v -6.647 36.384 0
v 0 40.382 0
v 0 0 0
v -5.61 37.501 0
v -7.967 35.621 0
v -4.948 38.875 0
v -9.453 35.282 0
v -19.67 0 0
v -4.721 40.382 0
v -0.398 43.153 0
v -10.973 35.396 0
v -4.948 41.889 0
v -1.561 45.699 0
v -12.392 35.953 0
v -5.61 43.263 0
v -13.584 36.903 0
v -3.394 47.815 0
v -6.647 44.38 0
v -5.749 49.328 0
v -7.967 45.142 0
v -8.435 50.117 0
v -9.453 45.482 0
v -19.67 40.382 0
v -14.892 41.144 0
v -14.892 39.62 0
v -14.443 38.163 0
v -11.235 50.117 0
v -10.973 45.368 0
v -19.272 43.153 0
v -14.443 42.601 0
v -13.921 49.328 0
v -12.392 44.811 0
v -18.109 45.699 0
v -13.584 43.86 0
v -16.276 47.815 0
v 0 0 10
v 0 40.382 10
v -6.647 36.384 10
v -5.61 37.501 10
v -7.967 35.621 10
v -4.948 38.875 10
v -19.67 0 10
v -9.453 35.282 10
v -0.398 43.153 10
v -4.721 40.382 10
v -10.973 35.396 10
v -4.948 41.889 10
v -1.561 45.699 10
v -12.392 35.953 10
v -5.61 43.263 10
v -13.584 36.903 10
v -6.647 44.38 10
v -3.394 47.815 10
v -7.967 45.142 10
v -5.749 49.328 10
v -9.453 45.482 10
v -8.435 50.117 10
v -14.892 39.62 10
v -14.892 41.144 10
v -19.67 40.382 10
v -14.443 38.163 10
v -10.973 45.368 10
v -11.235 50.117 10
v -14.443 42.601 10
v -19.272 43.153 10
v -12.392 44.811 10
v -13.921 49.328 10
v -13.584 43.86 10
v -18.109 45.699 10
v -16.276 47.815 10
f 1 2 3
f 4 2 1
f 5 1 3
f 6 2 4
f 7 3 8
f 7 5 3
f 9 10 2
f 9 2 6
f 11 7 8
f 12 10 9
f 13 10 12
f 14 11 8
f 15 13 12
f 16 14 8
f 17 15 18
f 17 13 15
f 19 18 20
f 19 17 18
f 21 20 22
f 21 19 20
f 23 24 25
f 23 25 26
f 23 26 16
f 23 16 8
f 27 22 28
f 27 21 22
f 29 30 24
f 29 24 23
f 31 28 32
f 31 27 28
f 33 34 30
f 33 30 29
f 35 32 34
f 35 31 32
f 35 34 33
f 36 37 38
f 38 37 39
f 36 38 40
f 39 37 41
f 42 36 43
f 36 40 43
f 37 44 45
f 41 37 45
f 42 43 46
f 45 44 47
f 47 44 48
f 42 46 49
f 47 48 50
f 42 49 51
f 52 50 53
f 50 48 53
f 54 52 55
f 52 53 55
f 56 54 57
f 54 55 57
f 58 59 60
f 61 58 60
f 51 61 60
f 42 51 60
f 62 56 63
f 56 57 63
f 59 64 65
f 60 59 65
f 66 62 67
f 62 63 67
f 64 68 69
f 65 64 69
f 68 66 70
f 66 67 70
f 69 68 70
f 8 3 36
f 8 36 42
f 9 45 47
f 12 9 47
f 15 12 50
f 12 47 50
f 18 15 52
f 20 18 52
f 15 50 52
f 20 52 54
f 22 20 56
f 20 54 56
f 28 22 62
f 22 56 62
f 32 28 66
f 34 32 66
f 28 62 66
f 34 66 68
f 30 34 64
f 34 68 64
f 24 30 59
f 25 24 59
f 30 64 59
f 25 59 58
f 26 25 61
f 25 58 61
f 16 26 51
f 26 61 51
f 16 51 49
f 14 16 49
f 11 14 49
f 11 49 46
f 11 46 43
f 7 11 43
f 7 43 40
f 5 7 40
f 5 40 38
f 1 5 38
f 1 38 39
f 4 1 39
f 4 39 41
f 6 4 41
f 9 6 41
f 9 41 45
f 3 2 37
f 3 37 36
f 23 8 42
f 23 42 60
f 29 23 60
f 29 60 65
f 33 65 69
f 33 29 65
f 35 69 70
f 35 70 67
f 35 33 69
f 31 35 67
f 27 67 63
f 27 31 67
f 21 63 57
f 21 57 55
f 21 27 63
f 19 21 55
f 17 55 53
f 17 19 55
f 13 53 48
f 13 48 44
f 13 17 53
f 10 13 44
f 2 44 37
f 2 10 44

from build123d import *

# Parameters (mm, degrees)
BOSS_EXTRUDE1_DEPTH = 10
CUT_EXTRUDE1_REACH  = 56.851
SKETCH2_R           = 5.114059111


with BuildPart() as part:
    # Sketch1 → Boss-Extrude1 (new body)
    with BuildSketch(Plane.XY):
        with BuildLine():
            Line((0, 0), (-19.67027632, 0))
            Line((-19.67027632, 0), (-19.67027632, 40.381920209))
            ThreePointArc((-19.67027632, 40.381920209), (-9.83513816, 50.217058369), (0, 40.381920209))
            Line((0, 40.381920209), (0, 0))
        make_face()
    extrude(amount=BOSS_EXTRUDE1_DEPTH)

    # Sketch2 → Cut-Extrude1 (cut, up to next)
    with BuildSketch(Plane.XY.offset(10), mode=Mode.PRIVATE) as cut_extrude1_sk1:
        with Locations((-9.83513816, 40.381920209)):
            Circle(SKETCH2_R)
    cut_extrude1_tool1 = extrude(cut_extrude1_sk1.sketch, amount=-CUT_EXTRUDE1_REACH, mode=Mode.PRIVATE) & part.part
    add(cut_extrude1_tool1.solids().sort_by_distance((-9.835138, 40.38192, 10))[0], mode=Mode.SUBTRACT)


solid = part.part
